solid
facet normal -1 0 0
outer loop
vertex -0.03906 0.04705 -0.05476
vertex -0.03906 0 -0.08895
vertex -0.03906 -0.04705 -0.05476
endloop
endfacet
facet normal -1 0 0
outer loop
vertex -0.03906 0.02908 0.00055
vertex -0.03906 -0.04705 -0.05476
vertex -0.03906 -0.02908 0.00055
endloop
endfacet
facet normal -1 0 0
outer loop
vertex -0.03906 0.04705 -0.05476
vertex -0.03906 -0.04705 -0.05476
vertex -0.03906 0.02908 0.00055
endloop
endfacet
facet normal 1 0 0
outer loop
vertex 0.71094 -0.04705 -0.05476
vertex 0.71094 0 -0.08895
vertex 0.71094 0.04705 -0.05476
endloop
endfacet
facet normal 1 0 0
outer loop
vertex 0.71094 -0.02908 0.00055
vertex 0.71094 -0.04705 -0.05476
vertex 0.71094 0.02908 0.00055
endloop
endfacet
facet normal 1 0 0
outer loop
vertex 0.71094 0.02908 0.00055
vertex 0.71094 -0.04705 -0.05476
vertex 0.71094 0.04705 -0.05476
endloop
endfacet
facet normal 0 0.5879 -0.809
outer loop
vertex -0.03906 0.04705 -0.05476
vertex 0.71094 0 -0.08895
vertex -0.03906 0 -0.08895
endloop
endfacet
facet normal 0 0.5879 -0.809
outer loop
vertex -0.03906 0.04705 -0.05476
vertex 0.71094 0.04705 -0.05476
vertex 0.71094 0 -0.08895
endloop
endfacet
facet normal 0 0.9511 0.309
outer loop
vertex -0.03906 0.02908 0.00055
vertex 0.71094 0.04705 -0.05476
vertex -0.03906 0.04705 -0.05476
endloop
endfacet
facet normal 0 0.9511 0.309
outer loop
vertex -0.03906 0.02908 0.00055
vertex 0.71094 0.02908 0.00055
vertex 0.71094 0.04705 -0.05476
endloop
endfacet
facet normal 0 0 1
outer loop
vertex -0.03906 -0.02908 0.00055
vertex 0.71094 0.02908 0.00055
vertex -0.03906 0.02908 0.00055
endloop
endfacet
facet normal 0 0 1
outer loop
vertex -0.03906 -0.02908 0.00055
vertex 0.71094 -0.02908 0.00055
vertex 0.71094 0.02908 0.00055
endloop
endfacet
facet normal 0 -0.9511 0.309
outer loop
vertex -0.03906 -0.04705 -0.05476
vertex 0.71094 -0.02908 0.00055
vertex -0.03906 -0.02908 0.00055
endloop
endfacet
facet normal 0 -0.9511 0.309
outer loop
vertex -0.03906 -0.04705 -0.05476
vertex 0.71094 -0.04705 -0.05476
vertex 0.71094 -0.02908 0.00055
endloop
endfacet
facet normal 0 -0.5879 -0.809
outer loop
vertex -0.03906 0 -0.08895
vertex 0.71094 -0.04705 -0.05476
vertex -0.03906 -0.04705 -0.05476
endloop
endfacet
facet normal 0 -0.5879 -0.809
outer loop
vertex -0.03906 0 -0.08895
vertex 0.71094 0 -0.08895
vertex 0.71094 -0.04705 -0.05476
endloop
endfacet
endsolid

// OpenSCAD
EPS = 0.01;

translate([-0.0390625, 0, 0])
    rotate([0, 90, 0])
        linear_extrude(height=0.75)
            translate([0.039473684210526314, 0])
                circle(r=0.039473684210526314 + EPS);
